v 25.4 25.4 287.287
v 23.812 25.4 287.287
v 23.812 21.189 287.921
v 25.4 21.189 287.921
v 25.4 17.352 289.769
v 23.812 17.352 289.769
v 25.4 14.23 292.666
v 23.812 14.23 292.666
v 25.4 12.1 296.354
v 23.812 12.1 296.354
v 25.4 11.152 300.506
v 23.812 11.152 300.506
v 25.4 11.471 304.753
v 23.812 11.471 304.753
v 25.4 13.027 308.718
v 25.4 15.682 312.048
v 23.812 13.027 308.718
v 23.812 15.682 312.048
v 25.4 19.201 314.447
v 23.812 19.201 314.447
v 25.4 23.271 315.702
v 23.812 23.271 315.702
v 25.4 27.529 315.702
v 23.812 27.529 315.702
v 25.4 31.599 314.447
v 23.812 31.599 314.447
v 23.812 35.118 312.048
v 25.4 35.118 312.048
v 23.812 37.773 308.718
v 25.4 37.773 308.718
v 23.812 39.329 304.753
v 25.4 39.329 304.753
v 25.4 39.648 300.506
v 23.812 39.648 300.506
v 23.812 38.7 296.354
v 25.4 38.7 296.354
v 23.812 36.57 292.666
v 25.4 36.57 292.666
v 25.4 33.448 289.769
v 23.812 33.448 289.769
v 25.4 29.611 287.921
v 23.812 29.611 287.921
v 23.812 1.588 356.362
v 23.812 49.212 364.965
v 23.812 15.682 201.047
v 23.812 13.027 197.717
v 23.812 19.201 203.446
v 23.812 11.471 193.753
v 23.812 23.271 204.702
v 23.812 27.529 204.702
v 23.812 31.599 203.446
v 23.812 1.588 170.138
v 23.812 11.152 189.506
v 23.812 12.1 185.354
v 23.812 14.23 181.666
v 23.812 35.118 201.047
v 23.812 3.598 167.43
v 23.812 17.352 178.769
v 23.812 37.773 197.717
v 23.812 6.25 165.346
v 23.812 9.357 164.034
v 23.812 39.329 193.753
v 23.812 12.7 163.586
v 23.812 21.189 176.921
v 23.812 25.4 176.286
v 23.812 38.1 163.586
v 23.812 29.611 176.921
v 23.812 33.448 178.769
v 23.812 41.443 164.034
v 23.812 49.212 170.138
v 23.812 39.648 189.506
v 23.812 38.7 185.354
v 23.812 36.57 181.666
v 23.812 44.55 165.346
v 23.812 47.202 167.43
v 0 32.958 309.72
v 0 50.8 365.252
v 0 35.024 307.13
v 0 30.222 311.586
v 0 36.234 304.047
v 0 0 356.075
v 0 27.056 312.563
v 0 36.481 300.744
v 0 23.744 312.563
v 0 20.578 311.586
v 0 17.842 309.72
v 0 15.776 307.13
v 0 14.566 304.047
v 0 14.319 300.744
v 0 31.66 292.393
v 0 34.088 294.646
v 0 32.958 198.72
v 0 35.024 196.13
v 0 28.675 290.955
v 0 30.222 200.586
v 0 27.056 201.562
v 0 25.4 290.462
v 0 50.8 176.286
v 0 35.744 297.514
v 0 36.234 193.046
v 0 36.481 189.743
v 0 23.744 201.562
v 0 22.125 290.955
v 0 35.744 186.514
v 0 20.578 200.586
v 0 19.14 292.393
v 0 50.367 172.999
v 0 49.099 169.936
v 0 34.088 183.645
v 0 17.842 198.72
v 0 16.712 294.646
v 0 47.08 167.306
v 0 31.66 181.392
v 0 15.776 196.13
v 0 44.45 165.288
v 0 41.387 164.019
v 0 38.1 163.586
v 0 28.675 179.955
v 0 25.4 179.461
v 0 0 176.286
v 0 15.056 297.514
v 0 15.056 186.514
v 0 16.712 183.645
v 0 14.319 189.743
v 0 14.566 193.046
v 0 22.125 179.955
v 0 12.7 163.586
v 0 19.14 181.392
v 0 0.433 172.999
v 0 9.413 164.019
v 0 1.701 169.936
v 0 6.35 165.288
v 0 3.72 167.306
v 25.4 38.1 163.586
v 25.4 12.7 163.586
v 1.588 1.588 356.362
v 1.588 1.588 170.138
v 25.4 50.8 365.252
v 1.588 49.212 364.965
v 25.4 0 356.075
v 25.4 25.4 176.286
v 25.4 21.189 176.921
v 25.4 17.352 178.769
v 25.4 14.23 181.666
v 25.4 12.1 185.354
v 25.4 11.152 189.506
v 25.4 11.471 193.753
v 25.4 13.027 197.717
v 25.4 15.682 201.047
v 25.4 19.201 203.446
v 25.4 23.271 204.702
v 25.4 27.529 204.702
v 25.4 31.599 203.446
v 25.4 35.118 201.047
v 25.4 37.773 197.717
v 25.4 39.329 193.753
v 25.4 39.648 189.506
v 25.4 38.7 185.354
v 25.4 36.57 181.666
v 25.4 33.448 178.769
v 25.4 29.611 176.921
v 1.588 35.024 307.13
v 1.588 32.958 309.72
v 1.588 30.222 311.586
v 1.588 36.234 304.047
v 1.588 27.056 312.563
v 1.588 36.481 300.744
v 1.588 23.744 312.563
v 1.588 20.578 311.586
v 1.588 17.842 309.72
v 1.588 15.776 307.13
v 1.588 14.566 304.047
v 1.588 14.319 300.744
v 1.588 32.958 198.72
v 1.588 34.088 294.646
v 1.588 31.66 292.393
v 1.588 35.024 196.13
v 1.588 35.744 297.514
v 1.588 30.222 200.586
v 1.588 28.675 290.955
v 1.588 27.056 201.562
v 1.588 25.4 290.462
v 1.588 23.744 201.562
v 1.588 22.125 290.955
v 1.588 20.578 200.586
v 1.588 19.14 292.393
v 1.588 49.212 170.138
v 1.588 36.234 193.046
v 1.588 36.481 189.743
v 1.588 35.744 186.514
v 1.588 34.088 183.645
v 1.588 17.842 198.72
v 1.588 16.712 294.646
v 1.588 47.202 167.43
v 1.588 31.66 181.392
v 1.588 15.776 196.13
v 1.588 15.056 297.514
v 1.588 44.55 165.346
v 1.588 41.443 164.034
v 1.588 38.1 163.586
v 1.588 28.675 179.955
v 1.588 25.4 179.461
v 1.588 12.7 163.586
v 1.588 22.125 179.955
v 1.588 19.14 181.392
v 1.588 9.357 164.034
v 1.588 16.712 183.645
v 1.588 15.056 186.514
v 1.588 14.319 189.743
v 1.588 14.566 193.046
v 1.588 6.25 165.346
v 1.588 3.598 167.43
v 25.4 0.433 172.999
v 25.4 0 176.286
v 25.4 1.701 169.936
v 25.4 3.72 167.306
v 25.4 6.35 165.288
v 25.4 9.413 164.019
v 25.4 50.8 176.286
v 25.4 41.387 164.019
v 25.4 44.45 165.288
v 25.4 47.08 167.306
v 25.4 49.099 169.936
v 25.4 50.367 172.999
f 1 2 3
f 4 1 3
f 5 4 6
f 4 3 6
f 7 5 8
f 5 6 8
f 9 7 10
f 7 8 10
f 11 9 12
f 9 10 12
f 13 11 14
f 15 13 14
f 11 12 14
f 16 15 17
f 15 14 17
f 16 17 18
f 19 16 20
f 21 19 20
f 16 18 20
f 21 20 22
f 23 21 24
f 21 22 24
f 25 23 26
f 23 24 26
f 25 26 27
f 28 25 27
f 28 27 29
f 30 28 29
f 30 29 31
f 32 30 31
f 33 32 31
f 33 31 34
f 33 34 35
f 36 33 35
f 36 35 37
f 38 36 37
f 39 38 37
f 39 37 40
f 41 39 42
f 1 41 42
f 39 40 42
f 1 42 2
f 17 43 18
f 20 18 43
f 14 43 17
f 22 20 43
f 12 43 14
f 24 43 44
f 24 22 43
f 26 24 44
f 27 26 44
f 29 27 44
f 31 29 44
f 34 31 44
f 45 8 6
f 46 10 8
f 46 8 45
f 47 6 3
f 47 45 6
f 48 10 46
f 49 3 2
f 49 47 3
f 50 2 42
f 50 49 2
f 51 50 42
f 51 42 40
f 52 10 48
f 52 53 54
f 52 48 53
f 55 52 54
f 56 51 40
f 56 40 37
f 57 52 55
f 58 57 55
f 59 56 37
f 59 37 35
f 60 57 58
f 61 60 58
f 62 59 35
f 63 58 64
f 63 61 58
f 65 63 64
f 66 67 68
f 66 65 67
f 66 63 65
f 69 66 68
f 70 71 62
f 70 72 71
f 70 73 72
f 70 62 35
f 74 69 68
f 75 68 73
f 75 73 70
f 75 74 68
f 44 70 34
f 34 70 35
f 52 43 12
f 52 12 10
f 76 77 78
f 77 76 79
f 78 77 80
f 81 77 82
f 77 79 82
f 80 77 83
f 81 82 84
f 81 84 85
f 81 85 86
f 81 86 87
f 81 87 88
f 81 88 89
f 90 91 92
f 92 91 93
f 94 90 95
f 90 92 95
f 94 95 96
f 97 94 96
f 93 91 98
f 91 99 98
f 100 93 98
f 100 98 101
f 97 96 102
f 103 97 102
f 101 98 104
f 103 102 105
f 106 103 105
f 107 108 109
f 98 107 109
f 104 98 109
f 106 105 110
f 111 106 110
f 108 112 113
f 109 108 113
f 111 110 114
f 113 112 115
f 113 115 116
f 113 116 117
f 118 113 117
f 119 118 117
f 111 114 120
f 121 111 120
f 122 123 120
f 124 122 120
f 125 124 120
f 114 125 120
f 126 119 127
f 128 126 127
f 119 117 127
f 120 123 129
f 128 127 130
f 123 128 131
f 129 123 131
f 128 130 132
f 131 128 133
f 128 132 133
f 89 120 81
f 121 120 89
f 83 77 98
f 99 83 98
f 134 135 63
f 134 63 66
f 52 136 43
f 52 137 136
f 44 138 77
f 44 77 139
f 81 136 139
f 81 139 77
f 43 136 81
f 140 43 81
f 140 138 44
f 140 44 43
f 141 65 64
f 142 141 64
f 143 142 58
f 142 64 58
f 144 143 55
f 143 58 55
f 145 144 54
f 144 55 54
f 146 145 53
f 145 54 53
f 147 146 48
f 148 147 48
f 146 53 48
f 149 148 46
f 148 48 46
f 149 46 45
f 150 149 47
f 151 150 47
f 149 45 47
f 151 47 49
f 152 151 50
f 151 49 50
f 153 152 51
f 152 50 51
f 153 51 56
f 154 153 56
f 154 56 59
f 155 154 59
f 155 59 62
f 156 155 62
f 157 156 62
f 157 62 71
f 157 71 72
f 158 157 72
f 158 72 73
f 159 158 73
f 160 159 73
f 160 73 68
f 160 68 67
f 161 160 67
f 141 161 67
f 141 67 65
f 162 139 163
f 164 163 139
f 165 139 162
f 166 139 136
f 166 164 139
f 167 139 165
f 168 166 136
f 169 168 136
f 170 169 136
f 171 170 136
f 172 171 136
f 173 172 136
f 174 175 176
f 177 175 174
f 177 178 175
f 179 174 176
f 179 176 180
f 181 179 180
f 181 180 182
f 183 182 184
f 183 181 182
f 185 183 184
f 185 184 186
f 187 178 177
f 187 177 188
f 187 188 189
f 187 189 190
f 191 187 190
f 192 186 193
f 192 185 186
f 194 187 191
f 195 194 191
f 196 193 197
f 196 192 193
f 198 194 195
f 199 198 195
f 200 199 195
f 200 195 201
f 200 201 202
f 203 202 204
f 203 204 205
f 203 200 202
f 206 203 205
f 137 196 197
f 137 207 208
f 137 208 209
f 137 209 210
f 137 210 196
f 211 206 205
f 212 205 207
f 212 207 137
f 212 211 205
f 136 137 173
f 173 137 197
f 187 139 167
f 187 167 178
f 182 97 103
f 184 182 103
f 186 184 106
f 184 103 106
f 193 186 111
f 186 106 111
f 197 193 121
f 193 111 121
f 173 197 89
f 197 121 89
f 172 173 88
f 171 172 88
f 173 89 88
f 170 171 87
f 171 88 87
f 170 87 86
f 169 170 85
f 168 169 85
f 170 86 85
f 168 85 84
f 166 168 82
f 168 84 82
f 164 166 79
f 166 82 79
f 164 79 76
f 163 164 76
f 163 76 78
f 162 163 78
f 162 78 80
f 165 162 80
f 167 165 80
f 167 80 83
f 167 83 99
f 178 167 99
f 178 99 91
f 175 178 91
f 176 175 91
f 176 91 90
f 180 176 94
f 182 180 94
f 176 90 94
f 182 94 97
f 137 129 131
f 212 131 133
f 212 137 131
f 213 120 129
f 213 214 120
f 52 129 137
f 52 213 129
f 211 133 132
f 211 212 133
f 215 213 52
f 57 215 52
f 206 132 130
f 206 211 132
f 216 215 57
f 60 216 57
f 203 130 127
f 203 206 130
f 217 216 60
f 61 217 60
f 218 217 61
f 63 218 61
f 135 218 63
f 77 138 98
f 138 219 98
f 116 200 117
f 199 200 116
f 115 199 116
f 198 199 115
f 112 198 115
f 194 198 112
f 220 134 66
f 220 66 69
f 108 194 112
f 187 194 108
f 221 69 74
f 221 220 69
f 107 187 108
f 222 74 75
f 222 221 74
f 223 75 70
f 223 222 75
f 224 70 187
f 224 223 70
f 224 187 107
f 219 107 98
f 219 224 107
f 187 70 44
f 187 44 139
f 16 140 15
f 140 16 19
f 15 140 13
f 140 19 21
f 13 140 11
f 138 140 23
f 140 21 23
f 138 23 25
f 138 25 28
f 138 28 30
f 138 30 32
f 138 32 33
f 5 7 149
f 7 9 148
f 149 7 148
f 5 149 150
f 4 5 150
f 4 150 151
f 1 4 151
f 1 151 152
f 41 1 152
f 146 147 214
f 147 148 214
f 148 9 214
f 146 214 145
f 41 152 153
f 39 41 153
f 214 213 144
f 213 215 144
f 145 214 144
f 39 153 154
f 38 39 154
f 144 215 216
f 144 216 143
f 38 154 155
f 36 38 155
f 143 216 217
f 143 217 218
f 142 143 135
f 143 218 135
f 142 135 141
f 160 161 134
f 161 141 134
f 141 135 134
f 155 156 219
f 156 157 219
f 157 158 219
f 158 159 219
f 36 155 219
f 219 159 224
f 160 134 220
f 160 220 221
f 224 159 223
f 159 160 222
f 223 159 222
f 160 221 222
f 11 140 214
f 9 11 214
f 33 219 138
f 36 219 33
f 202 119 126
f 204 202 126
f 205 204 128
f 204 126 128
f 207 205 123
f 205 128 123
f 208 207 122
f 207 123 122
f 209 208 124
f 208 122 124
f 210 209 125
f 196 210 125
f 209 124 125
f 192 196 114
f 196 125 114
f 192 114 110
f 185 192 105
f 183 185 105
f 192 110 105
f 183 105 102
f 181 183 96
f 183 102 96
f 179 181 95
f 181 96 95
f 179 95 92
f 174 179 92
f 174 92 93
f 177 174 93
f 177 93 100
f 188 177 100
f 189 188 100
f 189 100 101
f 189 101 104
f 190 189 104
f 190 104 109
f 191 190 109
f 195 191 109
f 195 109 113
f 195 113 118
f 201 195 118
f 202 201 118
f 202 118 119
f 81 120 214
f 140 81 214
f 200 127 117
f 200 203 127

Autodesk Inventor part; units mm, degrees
ref_plane "YZ Plane" through (0, 0, 0) normal (1, 0, 0) x (0, 1, 0)
ref_plane "XZ Plane" through (0, 0, 0) normal (0, 1, 0) x (-1, 0, 0)
ref_plane "XY Plane" through (0, 0, 0) normal (0, 0, 1) x (1, 0, 0)
sketch "Sketch1" plane through (0, 0, 0) normal (0, 0, 1) x (1, 0, 0)
  line L0 (0, 0) -> (25.4, 0)
  line L1 (25.4, 0) -> (25.4, 50.8)
  line L2 (25.4, 50.8) -> (0, 50.8)
  line L3 (0, 50.8) -> (0, 0)
  line L4 (1.5875, 1.5875) -> (23.8125, 1.5875)
  line L5 (23.8125, 1.5875) -> (23.8125, 49.2125)
  line L6 (23.8125, 49.2125) -> (1.5875, 49.2125)
  line L7 (1.5875, 49.2125) -> (1.5875, 1.5875)
  dimension "d0" = 25.4
  dimension "d1" = 50.8
  dimension "d2" = 1.5875
extrude "Extrusion1" add sketch "Sketch1" along normal blind 365.252
sketch "Sketch2" plane through (25.4, 0, 0) normal (1, 0, 0) x (0, 0, -1)
  line L0 (0, 50.8) -> (-365.252, 50.8) projected
  line L1 (-365.252, 50.8) -> (-356.075, 0)
  line L2 (-356.075, 0) -> (-365.252, 0)
  line L3 (0, 1.5875) -> (-365.252, 1.5875) projected
  line L4 (-365.252, 50.8) -> (-365.252, 0) projected
  line L5 (-365.252, 0) -> (-365.252, 50.8)
  point P0 (0, 0)
  dimension "d5" = 10.24
sketch "Sketch3" plane through (25.4, 0, 0) normal (1, 0, 0) x (0, 0, -1)
  line L0 (0, 0) -> (0, 50.8) projected
  line L1 (0, 50.8) -> (-365.252, 50.8) projected
  line L2 (0, 0) -> (-365.252, 0) projected
  line L3 (-365.252, 0) -> (-365.252, 50.8) projected
  point P0 (-50.8, 25.4)
  point P1 (-190.5737, 25.4)
  point P2 (-356.075, 0)
  point P3 (-301.5742, 25.4)
  dimension "d9" = 50.8
  dimension "d10" = 25.4
  dimension "d19" = 25.4
  dimension "d21" = 25.4
  dimension "d25" = 63.6778
  dimension "d28" = 174.6783
hole "Hole1" at (25.4, 25.4, 50.8) at (25.4, 25.4, 190.5737) at (25.4, 25.4, 301.5742) direction (-1, 0, 0) diameter 22.225 depth 25.4 tip angle 118
sketch "Sketch4" plane through (25.4, 0, 0) normal (1, 0, 0) x (0, 0, -1)
  line L0 (0, 50.8) -> (-365.252, 50.8) projected
  line L1 (-163.5862, 50.8) -> (0, 50.8)
  line L2 (0, 50.8) -> (0, 0)
  line L3 (0, 0) -> (-163.5862, 0)
  line L4 (-163.5862, 0) -> (-163.5862, 50.8)
  circle A0 centre (-190.5737, 25.4) radius 11.1125 projected
  dimension "d22" = 26.9875
extrude "Extrusion3" cut sketch "Sketch4" against normal blind 25.4 contours L2 L3 L4 L0
extrude "Extrusion4" cut sketch "Sketch2" against normal blind 25.4
fillet "Fillet1" radius 12.7 2 edges at (12.7, 50.8, 163.5862) (12.7, 0, 163.5862)
sketch "Sketch5" plane through (25.4, 12.7, 163.5862) normal (1, 0, 0) x (0, 0, -1)
  circle A0 centre (-26.9875, 12.7) radius 11.1125 projected
  circle A1 centre (-137.988, 12.7) radius 11.1125 projected
  point P0 (163.5862, -12.7)
  dimension "d30" = 0
  dimension "d31" = 0
hole "Hole2" at (25.4, 25.4, 190.5737) at (25.4, 25.4, 301.5742) direction (-1, 0, 0) diameter 28.575 depth 1.5875 tip angle 118
properties part number "ARM_030_TopIntakeSide" material "Aluminum 6061"
